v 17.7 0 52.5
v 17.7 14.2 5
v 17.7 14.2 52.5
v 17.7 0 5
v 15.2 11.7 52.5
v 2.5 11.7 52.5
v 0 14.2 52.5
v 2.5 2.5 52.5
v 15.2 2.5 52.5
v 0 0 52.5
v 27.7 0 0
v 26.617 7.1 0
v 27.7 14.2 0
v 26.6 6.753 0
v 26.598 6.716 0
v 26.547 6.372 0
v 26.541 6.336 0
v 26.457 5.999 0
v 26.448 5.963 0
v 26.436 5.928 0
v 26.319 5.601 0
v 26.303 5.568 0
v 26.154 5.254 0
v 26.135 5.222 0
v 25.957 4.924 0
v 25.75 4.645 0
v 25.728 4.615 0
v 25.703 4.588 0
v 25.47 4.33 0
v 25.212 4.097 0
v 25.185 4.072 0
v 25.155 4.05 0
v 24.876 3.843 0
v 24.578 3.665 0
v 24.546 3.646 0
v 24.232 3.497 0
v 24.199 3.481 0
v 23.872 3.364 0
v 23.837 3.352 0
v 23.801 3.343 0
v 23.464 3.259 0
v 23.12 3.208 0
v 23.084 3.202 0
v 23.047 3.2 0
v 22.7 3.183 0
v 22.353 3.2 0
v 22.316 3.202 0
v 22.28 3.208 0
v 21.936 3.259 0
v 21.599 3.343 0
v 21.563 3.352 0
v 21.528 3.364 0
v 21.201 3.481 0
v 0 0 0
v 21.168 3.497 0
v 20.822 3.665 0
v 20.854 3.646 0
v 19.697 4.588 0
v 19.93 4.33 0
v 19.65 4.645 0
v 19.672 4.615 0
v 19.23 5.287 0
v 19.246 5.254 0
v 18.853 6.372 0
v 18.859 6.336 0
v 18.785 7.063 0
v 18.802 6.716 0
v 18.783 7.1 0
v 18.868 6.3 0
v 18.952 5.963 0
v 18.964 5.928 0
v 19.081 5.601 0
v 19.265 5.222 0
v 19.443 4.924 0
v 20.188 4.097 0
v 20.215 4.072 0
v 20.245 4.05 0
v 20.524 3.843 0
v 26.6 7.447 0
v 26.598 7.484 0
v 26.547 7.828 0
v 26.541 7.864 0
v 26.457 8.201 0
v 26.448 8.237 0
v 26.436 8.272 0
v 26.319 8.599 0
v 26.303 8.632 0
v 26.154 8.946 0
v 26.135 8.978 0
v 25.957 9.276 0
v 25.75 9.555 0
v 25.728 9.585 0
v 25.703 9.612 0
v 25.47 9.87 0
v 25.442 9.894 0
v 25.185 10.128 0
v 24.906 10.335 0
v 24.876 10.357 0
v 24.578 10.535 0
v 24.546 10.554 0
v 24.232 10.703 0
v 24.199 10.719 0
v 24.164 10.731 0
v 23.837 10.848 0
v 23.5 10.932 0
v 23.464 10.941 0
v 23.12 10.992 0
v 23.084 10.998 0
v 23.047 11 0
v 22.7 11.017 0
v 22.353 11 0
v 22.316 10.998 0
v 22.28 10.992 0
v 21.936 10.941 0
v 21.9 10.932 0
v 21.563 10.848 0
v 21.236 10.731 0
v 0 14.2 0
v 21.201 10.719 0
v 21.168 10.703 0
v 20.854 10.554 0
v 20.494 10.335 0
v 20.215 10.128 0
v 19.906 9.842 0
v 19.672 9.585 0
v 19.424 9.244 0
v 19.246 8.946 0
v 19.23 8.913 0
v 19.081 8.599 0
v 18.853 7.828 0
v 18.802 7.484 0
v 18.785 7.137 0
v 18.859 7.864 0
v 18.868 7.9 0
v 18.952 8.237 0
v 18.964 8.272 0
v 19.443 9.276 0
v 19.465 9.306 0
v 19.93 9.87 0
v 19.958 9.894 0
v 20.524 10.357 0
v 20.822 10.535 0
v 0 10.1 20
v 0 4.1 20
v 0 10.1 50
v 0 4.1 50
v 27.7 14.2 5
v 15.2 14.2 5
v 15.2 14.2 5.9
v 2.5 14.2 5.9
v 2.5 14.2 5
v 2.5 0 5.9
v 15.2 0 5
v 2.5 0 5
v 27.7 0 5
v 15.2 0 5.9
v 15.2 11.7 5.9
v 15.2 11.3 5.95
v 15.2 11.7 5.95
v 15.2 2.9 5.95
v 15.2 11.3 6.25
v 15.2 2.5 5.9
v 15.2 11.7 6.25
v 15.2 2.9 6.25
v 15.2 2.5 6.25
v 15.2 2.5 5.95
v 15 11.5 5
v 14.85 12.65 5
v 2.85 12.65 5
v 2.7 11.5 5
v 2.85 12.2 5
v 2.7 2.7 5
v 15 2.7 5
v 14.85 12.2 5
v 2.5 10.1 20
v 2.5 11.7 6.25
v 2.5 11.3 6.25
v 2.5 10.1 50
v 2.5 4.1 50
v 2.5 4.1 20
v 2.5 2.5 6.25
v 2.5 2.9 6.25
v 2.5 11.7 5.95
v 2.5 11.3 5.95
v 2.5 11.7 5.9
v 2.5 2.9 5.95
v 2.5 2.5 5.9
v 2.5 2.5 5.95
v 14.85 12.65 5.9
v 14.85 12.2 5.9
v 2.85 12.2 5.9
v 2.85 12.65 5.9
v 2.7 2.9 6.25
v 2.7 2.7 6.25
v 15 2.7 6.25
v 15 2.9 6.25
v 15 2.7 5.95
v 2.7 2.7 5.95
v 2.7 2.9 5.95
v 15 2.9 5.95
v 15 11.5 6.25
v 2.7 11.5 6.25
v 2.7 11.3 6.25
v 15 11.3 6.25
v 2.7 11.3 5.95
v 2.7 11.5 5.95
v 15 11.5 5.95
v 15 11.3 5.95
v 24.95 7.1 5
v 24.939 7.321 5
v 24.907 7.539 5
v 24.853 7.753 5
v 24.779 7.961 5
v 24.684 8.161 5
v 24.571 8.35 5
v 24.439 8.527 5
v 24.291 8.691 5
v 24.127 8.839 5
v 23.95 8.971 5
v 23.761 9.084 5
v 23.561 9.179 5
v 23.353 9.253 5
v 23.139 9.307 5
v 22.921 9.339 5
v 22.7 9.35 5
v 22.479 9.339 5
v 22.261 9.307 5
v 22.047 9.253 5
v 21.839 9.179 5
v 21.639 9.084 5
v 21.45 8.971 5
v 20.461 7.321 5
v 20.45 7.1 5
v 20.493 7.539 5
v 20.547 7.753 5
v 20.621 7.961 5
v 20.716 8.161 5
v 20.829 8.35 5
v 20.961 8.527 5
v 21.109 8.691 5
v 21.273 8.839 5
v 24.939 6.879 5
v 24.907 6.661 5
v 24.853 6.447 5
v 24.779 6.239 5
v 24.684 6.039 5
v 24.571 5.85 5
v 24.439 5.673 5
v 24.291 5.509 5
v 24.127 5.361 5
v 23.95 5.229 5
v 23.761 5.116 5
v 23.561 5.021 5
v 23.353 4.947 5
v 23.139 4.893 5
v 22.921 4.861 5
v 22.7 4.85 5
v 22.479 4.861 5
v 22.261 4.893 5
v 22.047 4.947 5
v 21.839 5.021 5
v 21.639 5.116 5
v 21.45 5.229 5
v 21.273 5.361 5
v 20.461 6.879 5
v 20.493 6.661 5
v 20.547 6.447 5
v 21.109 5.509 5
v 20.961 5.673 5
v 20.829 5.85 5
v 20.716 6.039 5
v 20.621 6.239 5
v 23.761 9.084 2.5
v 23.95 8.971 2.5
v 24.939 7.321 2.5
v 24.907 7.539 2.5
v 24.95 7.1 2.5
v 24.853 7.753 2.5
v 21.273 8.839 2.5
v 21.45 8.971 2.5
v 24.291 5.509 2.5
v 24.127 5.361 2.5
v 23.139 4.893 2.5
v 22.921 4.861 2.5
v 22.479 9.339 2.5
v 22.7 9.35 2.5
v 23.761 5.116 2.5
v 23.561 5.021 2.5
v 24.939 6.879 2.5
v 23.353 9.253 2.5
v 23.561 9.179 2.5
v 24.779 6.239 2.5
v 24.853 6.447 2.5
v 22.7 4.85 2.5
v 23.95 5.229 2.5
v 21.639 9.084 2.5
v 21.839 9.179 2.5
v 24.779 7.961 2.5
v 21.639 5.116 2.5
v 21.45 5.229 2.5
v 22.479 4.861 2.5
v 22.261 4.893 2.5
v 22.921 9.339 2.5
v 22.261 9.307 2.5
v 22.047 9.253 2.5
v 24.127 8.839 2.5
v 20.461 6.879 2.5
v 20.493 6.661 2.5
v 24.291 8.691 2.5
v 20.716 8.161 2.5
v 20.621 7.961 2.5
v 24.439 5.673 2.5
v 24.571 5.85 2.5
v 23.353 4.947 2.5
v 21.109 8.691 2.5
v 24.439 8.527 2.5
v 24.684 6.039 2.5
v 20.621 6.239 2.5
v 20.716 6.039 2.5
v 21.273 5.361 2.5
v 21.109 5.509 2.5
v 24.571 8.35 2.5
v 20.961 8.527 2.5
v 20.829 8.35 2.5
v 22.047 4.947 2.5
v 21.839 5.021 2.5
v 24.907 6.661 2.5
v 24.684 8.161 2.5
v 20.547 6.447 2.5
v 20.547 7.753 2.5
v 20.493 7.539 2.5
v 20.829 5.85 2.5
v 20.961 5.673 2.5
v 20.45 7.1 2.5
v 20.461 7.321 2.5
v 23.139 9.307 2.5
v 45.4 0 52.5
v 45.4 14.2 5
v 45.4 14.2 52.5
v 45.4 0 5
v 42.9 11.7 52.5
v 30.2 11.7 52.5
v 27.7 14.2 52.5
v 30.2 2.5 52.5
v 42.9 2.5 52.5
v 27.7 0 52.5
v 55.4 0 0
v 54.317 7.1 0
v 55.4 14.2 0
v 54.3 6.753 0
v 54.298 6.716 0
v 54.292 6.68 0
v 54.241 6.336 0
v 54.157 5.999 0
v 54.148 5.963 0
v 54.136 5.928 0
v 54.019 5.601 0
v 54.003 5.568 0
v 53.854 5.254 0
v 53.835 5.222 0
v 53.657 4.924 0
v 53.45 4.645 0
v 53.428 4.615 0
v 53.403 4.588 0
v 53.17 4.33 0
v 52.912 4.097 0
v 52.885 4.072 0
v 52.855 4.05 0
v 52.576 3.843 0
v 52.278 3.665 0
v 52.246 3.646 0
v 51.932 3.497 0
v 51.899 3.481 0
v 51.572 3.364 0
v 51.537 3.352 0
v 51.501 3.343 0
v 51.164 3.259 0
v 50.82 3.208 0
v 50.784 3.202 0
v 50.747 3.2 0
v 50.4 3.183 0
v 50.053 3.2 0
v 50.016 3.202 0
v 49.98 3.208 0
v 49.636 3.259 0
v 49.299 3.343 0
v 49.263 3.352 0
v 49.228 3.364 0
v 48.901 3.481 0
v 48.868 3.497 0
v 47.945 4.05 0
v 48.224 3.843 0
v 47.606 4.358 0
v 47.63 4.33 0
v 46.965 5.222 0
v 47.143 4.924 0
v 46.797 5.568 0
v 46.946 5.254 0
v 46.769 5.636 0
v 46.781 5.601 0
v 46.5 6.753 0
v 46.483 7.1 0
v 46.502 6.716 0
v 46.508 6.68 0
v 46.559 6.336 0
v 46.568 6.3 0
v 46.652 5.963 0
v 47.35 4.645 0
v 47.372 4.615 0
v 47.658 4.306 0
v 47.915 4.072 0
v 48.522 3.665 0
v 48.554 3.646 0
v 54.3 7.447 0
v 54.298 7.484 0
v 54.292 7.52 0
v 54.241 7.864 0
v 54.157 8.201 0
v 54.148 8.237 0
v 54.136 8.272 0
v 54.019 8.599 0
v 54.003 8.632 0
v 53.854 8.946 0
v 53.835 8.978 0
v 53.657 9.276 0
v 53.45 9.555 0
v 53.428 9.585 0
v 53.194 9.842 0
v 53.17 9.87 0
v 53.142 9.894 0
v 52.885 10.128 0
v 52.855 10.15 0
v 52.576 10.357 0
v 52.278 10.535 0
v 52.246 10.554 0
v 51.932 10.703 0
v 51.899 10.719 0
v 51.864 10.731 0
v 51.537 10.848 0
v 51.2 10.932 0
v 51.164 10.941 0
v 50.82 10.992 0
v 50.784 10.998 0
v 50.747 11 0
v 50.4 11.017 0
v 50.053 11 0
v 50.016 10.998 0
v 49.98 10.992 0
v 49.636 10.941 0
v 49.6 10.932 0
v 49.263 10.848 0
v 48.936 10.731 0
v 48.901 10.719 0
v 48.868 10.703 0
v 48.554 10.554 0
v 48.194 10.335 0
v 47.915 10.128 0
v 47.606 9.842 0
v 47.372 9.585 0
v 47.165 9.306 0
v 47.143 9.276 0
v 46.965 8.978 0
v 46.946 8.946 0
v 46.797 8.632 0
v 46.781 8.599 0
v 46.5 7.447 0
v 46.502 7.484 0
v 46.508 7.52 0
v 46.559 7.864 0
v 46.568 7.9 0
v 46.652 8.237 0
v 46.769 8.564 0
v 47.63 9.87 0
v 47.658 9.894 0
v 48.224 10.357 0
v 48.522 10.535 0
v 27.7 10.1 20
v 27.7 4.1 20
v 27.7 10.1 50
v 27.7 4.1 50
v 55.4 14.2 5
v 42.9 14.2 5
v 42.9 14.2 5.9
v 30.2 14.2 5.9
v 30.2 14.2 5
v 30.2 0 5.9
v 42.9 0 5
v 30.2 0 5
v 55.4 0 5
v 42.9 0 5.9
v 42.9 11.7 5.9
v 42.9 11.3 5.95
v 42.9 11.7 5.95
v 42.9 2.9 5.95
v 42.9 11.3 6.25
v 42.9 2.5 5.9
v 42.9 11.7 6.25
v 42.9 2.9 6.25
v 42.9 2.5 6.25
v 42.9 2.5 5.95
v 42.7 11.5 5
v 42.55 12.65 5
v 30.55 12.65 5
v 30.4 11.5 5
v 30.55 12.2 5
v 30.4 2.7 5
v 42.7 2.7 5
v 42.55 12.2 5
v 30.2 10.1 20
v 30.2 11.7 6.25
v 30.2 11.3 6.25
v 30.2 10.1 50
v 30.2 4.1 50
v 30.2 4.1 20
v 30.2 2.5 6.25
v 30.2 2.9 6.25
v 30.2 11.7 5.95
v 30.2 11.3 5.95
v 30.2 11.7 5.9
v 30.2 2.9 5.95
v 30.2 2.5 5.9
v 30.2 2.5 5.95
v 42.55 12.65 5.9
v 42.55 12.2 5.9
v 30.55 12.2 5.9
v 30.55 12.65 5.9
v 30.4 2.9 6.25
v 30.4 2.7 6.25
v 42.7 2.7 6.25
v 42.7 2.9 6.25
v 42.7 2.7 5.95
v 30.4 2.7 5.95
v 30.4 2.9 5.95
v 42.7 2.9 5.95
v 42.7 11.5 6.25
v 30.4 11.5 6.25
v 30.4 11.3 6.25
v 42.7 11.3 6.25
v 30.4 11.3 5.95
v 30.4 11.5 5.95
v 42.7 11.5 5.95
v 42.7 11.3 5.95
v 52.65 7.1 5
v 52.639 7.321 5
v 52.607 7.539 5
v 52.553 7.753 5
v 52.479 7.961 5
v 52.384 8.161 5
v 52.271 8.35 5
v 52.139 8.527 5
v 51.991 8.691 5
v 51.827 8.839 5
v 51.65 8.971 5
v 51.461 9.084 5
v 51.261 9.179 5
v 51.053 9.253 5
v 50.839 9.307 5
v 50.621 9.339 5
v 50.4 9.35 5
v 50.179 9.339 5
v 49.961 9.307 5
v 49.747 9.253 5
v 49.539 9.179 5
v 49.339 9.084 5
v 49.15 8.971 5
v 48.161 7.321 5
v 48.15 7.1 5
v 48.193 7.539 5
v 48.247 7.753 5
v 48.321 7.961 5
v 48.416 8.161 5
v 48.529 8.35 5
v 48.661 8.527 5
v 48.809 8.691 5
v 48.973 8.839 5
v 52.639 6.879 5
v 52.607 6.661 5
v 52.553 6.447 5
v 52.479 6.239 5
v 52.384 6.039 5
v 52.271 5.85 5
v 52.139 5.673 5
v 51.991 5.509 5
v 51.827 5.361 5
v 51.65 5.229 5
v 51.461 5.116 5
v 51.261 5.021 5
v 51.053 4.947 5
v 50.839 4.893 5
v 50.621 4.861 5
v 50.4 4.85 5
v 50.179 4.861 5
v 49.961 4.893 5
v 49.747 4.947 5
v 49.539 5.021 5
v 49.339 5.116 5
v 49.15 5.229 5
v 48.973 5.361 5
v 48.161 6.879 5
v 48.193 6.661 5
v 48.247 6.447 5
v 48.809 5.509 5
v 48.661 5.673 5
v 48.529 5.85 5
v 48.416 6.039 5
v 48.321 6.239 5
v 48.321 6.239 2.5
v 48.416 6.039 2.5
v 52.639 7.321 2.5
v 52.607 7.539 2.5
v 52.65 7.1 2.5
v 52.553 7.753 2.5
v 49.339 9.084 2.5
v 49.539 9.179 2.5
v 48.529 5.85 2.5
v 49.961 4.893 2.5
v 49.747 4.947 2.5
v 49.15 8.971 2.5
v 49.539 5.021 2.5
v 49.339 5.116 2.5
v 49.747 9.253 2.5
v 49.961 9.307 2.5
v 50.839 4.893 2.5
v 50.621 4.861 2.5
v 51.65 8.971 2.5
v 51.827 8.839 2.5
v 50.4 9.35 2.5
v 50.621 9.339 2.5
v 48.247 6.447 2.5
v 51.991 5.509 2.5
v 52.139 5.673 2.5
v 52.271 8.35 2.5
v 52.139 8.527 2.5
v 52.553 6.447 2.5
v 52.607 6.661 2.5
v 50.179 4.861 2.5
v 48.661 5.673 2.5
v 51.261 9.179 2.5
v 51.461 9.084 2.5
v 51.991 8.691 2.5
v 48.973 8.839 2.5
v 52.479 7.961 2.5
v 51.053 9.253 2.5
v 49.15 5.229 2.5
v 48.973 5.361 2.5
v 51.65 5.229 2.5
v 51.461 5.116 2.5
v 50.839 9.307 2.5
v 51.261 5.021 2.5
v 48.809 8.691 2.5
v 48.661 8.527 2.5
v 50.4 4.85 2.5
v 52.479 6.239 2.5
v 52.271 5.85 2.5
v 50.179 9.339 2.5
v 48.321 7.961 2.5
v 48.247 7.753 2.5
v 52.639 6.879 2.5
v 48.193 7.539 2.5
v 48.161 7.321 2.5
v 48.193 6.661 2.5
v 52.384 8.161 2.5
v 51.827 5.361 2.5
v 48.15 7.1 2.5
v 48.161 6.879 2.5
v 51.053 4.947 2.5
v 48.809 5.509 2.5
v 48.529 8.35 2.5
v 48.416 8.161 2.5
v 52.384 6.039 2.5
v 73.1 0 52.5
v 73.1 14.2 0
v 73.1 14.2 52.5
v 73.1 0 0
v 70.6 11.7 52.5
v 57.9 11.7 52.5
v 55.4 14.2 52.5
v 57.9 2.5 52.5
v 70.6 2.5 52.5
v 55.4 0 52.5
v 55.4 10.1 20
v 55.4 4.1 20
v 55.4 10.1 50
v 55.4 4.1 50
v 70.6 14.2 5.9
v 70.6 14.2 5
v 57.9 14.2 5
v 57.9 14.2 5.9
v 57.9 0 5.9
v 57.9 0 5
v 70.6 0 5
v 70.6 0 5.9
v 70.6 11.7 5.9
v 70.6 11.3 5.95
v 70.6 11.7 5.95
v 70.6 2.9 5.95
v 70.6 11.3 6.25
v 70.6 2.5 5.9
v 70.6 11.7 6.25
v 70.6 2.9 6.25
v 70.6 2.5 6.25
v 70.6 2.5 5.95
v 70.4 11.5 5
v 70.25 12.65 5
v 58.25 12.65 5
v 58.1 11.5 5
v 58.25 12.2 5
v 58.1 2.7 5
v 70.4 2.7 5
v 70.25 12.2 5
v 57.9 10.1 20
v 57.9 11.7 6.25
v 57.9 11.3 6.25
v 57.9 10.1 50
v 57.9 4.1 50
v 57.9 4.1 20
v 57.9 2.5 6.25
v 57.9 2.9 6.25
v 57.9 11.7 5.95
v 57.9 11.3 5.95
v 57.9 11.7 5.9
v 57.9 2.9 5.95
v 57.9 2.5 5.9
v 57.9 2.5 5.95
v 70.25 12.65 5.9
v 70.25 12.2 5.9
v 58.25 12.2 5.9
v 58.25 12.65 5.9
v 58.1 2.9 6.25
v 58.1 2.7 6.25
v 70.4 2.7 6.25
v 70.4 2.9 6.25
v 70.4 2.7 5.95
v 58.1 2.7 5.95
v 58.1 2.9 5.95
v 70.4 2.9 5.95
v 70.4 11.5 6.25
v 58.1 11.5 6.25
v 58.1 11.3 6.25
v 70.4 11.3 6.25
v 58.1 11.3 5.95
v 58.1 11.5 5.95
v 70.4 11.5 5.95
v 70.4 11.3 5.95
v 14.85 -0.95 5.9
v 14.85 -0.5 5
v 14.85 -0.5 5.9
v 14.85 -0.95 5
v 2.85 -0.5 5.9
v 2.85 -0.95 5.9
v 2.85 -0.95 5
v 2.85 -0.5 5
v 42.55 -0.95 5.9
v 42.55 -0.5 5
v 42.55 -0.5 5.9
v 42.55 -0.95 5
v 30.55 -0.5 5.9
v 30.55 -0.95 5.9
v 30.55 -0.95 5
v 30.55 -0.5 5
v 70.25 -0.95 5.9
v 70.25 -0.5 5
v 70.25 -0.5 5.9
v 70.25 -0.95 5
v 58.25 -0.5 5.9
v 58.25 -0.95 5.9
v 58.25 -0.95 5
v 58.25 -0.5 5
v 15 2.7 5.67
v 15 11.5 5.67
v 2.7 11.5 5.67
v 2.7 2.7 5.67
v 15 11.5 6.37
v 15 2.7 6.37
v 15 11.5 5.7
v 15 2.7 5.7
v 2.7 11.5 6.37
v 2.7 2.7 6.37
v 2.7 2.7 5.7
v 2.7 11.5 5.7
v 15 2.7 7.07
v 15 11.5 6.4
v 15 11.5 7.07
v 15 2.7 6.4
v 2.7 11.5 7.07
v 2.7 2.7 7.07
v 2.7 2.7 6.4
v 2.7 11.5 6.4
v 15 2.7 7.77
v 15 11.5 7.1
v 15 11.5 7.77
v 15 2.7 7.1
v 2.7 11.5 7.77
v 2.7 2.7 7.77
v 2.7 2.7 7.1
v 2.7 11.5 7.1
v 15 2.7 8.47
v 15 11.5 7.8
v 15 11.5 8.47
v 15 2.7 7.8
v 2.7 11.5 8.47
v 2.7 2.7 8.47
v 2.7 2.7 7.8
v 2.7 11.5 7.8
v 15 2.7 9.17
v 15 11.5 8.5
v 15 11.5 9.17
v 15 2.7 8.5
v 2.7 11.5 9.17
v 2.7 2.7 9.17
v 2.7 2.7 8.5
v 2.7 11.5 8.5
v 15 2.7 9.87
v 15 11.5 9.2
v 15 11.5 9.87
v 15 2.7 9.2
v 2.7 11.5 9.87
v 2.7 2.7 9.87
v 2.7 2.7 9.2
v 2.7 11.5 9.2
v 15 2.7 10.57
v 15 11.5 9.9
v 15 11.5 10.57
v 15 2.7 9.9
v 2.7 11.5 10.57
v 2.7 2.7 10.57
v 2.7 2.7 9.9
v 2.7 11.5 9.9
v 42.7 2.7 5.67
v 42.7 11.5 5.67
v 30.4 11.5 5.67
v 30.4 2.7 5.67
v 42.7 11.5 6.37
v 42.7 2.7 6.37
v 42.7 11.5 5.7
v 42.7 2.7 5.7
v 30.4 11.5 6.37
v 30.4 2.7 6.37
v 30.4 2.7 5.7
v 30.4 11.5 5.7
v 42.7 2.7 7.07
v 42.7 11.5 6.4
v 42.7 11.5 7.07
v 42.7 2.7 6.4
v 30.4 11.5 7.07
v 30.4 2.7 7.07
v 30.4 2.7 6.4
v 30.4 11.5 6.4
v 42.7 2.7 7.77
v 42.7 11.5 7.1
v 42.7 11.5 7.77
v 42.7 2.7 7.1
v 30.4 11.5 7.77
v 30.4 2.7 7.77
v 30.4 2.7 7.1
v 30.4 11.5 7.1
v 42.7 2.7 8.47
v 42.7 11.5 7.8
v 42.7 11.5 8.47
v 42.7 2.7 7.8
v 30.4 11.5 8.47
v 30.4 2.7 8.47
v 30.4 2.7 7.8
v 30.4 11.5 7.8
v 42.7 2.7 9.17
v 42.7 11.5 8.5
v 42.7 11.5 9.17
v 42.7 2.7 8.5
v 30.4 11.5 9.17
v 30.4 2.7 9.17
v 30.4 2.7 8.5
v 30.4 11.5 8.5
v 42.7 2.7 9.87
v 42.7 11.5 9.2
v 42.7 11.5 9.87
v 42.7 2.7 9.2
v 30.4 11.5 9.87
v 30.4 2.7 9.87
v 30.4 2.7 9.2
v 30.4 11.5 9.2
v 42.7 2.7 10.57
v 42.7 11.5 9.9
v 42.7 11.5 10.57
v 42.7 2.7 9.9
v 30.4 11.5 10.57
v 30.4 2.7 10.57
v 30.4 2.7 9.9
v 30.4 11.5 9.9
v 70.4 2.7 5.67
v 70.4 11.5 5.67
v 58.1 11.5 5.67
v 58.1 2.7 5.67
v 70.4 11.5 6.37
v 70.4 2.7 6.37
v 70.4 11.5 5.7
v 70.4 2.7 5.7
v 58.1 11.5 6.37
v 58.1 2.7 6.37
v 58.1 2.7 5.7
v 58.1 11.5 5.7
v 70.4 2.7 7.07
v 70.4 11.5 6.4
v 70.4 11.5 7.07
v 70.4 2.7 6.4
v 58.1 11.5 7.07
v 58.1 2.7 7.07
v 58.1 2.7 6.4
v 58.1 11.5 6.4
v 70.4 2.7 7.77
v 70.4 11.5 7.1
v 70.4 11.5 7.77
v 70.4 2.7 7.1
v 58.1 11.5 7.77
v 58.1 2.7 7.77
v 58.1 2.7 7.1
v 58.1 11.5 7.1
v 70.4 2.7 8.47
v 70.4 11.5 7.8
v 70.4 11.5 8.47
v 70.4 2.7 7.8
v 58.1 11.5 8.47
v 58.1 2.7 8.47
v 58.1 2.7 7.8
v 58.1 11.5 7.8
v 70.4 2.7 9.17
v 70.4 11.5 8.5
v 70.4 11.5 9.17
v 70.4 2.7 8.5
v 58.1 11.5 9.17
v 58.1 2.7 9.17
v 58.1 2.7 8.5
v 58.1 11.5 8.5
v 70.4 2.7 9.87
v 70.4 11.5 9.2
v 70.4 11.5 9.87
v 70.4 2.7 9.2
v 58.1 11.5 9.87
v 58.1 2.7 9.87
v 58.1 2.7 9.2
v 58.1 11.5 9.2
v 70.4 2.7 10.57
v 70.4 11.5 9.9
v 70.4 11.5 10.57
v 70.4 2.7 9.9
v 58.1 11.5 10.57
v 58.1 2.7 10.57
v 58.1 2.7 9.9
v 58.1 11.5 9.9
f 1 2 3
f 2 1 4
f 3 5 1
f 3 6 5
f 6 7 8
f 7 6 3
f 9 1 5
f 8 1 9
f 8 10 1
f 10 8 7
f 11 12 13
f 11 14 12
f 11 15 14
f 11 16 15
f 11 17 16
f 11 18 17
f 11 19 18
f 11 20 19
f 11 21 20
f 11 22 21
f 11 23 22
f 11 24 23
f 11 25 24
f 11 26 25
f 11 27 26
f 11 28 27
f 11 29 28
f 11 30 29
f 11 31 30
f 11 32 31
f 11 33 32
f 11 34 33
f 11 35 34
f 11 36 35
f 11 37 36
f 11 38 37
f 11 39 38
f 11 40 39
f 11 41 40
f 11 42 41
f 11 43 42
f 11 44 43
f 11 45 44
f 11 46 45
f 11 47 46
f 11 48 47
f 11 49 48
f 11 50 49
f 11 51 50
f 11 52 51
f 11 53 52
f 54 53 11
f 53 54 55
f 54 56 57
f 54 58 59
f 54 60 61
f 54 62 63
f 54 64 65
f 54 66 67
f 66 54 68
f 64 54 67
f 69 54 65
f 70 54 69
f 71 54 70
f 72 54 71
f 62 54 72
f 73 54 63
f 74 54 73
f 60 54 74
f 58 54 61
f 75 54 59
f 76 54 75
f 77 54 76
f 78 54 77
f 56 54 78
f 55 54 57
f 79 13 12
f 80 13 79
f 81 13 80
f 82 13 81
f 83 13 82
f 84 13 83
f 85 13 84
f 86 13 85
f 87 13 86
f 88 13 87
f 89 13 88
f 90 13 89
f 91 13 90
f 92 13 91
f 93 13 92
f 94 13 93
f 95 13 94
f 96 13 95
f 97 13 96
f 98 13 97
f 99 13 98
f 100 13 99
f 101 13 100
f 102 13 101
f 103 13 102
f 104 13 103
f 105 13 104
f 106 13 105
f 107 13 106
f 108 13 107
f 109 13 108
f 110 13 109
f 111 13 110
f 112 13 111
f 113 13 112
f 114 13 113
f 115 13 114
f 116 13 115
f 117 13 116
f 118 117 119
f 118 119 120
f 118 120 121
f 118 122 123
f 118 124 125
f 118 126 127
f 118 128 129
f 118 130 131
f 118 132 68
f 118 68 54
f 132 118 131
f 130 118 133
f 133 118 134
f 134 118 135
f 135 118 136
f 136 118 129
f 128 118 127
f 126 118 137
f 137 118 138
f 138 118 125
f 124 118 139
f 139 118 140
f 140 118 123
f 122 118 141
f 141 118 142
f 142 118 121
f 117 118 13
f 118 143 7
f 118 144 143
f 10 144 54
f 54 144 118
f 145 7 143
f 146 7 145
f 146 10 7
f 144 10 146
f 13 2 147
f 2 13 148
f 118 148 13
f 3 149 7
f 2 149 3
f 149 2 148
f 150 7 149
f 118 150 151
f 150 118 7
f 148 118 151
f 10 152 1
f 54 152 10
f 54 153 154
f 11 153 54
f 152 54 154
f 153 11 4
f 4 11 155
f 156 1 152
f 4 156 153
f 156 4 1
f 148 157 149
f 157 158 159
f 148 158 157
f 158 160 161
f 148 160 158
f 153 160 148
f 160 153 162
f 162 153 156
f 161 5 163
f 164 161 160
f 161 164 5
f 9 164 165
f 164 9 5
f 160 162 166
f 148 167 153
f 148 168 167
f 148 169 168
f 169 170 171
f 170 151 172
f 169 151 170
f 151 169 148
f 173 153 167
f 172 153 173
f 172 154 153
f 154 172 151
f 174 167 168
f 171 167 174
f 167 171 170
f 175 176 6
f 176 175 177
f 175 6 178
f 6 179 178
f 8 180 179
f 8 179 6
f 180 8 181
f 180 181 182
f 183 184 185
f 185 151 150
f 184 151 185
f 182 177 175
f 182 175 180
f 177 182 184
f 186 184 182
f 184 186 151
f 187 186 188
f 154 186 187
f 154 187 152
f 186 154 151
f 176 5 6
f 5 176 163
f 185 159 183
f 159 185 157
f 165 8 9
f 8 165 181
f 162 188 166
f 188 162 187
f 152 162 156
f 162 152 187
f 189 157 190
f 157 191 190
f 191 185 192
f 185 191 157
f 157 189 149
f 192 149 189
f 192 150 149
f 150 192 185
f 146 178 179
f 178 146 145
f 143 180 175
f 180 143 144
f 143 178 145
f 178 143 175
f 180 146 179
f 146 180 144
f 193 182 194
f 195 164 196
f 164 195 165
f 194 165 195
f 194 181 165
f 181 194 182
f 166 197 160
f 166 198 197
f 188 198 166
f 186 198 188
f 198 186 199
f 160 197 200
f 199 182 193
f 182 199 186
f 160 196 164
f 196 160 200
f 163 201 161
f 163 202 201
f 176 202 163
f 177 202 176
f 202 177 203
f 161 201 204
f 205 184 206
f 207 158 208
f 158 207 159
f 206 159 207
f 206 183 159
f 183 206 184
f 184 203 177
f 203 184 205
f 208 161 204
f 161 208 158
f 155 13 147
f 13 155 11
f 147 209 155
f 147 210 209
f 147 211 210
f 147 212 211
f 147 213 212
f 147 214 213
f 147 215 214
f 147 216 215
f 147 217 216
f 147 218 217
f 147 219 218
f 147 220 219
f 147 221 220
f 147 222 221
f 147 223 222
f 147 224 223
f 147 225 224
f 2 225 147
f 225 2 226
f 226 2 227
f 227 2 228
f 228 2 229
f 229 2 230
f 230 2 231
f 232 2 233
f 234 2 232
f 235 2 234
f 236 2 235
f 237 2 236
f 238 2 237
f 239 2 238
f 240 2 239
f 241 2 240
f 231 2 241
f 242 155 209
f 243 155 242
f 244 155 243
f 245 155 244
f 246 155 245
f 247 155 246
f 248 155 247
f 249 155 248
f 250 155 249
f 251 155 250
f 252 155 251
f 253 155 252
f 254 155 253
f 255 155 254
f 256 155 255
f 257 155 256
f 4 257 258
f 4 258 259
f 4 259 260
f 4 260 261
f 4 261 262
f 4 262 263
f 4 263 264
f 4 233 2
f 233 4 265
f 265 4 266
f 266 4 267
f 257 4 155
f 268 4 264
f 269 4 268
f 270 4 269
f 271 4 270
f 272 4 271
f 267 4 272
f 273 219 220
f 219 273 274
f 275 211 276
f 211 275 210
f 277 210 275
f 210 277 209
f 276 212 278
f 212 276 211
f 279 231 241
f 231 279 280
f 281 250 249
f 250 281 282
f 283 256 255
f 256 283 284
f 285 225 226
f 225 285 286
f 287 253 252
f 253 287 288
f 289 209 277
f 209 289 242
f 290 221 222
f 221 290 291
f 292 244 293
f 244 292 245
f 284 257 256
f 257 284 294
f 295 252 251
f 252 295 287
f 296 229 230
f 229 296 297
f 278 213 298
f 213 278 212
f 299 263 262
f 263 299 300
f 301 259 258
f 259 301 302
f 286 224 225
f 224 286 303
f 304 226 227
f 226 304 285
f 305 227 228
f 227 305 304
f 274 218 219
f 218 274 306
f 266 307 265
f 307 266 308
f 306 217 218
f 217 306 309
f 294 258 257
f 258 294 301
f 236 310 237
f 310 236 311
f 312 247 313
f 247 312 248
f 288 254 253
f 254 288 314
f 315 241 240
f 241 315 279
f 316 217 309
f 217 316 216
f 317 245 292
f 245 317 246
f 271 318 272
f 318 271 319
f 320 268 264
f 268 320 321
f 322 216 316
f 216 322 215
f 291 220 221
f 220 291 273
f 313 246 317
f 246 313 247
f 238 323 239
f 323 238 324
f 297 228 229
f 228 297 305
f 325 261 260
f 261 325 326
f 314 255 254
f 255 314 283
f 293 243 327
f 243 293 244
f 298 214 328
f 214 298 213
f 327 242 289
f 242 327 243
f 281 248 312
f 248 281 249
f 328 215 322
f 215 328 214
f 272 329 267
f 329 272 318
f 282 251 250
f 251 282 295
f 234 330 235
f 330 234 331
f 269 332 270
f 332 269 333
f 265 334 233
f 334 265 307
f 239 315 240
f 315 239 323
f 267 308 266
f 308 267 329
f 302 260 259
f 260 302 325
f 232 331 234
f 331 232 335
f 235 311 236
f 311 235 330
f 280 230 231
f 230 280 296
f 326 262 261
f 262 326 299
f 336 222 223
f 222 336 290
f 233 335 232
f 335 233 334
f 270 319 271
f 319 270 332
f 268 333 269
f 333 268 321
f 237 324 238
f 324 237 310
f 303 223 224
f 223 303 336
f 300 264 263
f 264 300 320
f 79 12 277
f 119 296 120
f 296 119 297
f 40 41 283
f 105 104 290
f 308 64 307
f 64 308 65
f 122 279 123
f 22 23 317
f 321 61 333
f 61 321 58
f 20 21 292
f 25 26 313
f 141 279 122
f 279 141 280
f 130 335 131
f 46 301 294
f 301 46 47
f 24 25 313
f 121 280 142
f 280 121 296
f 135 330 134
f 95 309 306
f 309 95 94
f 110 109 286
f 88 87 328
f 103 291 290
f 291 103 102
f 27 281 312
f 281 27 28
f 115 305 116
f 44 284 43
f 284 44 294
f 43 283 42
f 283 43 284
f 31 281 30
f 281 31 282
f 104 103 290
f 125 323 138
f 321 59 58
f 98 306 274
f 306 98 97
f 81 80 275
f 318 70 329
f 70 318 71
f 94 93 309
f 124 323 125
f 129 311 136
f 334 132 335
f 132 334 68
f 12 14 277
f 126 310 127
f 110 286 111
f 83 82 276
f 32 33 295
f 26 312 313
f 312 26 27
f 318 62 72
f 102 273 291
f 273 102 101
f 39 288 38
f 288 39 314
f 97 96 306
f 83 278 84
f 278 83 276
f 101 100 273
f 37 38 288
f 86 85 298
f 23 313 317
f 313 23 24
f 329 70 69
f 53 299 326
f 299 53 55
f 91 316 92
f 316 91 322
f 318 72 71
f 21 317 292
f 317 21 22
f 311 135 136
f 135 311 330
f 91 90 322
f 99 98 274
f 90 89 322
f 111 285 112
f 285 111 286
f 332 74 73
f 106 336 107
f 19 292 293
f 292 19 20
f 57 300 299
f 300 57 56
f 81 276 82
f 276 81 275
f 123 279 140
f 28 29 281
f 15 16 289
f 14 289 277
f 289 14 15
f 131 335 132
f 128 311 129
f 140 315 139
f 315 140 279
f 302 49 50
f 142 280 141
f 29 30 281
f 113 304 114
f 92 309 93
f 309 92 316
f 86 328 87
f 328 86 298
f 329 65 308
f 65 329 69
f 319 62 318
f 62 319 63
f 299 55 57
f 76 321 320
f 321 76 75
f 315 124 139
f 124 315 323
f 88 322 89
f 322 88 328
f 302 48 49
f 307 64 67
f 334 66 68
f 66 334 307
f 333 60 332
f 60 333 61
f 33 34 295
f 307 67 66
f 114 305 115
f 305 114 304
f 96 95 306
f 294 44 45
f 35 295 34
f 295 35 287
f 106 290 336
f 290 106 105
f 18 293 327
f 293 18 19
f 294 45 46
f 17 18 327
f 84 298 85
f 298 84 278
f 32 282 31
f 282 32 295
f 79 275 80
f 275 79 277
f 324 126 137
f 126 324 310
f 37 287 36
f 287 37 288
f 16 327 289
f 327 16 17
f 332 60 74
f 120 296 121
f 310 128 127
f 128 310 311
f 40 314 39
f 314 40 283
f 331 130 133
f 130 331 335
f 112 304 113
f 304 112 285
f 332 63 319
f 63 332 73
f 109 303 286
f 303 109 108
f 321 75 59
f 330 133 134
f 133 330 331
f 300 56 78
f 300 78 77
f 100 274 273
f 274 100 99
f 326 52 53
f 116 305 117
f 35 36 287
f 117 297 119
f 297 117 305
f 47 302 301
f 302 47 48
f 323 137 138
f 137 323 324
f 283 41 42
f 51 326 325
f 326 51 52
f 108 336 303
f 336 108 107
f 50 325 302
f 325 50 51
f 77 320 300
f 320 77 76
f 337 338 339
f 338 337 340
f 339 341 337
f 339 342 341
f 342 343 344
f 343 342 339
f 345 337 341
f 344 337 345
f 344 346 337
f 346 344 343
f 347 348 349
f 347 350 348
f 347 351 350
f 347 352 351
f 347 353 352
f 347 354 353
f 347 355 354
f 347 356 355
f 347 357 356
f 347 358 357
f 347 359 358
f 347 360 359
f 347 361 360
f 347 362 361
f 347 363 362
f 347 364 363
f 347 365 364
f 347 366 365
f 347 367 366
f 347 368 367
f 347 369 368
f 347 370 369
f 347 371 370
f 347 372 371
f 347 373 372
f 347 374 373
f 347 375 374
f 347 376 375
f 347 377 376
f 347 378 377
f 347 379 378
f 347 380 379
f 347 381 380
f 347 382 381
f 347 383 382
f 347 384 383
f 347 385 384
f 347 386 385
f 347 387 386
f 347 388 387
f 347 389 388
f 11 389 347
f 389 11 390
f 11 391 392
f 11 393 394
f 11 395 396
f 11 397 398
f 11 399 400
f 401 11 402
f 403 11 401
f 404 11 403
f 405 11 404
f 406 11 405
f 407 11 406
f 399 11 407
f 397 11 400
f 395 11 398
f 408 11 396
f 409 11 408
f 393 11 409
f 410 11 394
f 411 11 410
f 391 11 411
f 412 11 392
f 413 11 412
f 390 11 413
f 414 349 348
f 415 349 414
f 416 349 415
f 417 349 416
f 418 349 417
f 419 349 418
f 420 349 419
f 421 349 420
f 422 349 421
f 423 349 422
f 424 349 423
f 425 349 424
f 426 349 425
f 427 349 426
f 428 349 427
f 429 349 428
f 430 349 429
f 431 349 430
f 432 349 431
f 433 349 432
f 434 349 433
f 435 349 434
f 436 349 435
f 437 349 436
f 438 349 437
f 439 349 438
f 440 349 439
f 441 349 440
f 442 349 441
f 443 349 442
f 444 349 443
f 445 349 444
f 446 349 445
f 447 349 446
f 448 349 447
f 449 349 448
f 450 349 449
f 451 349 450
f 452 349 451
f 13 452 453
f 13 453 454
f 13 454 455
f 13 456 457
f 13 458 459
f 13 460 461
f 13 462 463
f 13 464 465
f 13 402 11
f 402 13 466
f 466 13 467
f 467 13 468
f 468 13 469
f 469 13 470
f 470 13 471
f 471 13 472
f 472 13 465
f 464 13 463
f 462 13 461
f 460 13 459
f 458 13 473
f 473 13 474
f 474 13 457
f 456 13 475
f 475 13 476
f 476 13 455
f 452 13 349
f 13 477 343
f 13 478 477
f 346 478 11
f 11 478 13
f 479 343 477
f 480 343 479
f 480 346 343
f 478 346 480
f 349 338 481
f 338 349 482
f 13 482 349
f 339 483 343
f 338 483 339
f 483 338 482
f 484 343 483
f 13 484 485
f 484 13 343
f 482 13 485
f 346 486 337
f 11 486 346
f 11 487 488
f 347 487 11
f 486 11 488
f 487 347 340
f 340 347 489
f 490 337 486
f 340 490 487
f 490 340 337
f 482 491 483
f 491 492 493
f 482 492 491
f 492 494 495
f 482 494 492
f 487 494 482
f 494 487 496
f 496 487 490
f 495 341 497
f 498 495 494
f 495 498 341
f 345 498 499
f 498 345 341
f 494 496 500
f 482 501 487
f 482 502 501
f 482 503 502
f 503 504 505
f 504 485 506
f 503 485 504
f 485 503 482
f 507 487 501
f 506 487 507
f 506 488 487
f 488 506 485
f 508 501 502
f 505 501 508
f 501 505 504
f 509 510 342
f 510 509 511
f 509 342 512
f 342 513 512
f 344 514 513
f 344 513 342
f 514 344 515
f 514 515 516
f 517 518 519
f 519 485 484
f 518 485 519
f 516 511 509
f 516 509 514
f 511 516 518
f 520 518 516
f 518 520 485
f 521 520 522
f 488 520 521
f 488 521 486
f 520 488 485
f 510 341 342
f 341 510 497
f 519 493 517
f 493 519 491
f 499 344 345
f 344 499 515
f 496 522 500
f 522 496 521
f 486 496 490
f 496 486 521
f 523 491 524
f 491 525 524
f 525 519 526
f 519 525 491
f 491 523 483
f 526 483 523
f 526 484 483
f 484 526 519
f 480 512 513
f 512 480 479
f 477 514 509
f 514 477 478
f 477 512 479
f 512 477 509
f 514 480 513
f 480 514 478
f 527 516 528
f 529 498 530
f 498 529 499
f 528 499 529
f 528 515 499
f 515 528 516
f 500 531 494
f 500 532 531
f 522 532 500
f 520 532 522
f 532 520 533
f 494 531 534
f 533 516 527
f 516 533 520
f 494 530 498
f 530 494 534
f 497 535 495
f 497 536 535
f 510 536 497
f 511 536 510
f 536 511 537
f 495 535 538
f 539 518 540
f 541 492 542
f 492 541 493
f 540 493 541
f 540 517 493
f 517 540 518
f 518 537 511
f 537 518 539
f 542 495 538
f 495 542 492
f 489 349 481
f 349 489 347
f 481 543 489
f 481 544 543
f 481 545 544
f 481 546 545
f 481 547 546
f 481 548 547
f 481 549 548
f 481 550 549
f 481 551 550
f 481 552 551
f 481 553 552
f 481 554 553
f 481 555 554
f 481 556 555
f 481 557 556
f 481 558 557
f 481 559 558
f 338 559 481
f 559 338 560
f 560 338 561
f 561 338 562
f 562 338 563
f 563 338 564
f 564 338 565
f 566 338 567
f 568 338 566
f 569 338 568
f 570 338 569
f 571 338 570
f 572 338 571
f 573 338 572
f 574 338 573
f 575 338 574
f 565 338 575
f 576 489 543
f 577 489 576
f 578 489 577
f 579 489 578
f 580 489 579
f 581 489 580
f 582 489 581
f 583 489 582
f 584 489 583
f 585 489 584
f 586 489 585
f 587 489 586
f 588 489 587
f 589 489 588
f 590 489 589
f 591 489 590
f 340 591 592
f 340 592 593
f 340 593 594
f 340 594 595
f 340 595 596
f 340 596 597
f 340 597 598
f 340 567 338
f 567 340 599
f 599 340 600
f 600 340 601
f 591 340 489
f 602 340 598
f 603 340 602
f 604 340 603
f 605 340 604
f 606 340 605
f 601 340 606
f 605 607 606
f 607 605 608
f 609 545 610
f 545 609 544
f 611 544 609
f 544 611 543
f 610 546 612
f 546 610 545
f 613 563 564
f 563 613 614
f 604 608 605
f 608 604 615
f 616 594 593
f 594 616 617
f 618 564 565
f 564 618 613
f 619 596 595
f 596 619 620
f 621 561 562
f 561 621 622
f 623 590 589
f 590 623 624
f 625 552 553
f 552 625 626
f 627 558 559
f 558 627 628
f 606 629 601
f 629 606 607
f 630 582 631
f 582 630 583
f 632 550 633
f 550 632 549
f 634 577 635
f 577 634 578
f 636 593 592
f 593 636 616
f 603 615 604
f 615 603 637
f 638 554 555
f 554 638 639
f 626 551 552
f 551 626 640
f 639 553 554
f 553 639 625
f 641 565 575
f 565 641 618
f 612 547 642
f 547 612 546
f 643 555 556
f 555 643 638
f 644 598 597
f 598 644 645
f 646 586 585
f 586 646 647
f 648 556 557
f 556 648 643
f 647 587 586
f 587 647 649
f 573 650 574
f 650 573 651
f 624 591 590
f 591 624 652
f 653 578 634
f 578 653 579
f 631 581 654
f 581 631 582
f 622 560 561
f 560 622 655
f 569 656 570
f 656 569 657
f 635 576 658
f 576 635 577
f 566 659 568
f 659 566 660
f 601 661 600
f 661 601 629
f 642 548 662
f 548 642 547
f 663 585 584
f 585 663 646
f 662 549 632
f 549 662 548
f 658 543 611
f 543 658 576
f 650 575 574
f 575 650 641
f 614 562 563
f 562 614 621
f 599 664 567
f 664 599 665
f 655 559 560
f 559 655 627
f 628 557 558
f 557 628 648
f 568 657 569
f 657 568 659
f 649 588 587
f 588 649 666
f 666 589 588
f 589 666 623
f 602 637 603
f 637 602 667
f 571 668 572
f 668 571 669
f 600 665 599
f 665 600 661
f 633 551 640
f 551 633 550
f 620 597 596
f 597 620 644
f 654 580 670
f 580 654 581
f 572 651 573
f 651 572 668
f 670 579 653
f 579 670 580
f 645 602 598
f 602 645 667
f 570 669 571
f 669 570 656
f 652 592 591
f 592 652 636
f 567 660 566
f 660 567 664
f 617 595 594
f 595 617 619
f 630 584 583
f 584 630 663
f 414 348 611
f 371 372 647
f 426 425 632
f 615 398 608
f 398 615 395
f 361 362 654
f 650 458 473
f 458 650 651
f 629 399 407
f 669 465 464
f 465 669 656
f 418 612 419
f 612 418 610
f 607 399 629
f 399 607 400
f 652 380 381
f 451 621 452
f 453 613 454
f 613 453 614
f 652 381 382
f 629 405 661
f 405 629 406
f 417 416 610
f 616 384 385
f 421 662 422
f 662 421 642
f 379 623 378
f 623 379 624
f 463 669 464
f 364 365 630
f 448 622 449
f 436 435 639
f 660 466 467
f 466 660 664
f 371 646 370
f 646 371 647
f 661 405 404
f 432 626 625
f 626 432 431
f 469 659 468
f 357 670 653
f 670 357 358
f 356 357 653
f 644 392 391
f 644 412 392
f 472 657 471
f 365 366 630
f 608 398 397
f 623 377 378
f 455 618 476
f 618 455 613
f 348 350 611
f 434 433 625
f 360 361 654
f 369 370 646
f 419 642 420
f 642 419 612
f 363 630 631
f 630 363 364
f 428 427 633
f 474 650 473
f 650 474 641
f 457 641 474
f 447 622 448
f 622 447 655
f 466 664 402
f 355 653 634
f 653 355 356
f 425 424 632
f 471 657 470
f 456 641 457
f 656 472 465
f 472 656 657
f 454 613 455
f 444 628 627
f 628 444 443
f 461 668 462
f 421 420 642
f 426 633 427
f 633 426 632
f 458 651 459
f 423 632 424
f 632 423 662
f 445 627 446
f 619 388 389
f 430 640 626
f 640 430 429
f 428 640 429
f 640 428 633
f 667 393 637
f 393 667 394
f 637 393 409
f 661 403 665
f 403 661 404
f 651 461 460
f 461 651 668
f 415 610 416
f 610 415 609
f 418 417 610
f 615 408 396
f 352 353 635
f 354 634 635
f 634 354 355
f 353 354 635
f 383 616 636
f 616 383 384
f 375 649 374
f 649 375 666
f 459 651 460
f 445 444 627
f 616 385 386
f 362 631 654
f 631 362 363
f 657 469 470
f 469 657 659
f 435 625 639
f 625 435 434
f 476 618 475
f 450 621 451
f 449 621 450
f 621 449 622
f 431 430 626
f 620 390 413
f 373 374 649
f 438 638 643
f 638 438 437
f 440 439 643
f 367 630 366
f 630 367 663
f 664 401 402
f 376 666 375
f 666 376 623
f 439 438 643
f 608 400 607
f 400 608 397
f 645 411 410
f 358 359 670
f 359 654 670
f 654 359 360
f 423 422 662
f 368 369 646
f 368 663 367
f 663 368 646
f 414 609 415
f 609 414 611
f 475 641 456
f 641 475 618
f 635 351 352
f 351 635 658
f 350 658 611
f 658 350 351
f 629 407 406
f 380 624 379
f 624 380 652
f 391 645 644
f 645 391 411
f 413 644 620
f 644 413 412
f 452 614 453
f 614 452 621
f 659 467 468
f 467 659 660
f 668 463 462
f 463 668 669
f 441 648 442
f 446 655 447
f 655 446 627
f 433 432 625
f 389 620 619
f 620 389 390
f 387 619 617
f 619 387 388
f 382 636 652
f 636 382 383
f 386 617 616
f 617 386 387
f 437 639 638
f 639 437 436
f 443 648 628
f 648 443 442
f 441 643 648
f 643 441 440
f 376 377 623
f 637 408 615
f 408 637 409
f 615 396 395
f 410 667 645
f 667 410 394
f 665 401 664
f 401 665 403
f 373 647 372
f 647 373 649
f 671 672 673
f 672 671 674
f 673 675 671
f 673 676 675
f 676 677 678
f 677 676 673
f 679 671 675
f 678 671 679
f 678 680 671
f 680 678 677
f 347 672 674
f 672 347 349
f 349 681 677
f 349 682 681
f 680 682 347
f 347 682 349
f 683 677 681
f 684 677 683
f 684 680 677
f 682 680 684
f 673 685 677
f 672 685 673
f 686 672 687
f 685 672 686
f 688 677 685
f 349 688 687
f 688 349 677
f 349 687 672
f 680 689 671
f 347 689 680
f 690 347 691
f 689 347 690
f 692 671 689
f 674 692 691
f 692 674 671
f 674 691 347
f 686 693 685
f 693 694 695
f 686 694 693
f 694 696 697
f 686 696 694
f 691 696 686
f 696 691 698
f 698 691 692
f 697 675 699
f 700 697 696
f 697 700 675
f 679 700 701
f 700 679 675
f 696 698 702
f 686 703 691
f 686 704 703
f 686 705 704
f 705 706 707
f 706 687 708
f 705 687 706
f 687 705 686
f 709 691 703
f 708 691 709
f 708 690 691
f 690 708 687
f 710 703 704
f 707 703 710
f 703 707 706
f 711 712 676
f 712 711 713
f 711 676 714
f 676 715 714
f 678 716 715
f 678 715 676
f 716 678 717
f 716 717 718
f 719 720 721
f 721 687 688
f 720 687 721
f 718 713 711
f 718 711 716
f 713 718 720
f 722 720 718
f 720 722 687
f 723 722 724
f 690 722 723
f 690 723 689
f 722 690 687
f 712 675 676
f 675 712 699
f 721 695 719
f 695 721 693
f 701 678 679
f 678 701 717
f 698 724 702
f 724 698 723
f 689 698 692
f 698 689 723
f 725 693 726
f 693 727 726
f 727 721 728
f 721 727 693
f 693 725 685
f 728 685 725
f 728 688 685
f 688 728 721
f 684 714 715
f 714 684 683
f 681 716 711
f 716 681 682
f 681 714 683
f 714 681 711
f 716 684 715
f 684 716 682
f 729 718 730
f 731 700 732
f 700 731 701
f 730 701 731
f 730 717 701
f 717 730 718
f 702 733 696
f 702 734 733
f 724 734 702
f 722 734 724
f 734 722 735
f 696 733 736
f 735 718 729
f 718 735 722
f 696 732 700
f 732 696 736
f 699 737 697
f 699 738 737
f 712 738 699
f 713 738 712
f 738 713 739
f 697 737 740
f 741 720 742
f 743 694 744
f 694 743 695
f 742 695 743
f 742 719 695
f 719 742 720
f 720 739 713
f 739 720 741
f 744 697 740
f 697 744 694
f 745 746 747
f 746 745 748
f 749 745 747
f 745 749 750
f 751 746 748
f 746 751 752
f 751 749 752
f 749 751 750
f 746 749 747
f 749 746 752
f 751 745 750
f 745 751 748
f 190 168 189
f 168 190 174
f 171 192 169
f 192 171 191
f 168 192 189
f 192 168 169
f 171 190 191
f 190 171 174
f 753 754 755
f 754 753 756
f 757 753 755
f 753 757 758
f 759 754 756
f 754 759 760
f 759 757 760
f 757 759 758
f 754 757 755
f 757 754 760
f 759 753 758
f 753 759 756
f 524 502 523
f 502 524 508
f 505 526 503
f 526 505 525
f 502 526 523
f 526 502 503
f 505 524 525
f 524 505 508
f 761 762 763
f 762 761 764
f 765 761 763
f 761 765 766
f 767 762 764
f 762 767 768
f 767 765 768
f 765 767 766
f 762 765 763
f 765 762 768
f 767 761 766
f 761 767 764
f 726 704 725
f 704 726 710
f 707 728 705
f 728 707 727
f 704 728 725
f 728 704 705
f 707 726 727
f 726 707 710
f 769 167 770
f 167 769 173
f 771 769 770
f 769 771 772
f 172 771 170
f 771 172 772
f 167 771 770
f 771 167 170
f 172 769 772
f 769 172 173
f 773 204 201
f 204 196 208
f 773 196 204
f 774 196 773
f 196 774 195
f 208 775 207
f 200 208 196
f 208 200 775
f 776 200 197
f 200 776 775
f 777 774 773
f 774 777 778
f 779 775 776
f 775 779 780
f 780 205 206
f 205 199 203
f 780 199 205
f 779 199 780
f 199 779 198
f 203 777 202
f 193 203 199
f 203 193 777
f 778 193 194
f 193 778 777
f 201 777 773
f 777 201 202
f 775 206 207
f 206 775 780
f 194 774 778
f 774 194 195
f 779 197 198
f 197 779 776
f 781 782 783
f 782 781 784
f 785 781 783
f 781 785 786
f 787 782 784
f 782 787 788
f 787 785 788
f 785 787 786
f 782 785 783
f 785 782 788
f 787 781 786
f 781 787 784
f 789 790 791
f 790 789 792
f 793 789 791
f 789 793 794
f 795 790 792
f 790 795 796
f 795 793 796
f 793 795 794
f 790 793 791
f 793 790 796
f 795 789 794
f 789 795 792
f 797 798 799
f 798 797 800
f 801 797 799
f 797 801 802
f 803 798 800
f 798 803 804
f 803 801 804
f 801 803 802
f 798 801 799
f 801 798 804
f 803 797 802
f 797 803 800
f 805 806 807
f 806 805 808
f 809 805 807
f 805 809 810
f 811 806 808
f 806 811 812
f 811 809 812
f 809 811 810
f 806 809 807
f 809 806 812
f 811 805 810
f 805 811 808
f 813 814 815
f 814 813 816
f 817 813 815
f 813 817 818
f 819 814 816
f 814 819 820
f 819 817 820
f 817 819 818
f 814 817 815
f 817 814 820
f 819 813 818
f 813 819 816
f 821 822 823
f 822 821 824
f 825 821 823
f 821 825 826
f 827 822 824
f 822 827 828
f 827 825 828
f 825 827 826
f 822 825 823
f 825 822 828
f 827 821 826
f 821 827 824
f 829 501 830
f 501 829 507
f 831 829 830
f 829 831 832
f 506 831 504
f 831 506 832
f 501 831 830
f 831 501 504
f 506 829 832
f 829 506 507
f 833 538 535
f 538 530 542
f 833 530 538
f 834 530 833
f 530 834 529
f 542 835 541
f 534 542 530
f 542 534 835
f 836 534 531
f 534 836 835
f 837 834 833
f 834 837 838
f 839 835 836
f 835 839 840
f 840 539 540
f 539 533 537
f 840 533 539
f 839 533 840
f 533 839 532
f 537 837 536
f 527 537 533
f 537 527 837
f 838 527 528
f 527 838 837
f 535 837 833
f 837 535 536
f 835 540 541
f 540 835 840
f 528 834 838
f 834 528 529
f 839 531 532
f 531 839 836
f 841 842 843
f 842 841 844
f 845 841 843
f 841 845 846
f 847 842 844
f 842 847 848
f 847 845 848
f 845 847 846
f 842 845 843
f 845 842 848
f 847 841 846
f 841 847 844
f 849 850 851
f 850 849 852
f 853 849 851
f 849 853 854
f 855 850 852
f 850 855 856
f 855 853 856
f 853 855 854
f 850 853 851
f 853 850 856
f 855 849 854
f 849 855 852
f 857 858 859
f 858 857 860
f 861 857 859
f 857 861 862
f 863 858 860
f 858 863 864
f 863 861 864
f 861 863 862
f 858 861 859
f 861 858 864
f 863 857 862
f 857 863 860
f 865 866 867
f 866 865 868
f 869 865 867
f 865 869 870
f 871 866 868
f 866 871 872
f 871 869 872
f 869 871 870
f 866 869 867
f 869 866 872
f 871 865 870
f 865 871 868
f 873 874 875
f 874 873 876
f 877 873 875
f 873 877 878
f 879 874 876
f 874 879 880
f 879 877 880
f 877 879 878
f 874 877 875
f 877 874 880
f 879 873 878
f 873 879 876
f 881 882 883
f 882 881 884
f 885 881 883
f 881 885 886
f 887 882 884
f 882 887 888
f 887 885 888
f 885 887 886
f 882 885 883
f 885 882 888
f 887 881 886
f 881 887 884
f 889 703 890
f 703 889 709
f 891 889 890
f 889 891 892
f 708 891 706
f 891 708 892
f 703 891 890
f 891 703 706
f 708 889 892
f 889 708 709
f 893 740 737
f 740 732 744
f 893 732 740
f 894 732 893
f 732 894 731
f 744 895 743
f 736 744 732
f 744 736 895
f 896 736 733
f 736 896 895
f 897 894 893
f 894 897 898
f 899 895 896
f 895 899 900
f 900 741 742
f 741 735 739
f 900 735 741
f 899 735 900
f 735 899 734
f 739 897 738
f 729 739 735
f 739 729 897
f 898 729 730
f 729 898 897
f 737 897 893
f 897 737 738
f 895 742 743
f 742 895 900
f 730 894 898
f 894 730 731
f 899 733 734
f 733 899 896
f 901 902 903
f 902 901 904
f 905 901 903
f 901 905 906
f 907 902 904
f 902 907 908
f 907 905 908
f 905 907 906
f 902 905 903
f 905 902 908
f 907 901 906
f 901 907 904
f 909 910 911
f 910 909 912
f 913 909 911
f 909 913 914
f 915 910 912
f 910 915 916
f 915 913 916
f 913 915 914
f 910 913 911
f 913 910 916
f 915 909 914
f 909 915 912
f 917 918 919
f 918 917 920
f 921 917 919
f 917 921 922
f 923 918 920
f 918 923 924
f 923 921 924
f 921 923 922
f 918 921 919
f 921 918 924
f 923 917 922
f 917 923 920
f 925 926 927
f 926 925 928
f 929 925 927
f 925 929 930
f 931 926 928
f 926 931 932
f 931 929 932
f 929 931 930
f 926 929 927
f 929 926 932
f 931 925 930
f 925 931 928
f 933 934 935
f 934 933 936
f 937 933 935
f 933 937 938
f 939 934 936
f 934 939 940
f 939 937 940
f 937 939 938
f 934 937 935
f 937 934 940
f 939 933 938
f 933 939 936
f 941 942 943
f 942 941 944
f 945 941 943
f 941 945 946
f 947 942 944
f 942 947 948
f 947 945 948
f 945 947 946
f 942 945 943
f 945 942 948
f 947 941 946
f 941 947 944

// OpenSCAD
// Triple Nano-SIM Gravity Dispenser Array - Ceiling Mount
// VERSION 3.0 - Production Array with Downward Mounting
// Units: mm

$fn = 64;

// ========================
// PARAMETERS
// ========================

// Core SIM specs (Nano-SIM)
card_w = 12.3;    // X-axis (longer side)
card_d = 8.8;     // Y-axis (shorter side)  
card_t = 0.67;    // Z-axis (thickness)

// Capacity & spacing
N_CARDS = 50;
inter_gap = 0.03;
headroom = 5;

// Clearances
clearance_side = 0.2;
inner_w = card_w + 2*clearance_side;
inner_d = card_d + 2*clearance_side;

// Structure
wall = 2.5;
base_thk = 5.0;      // Base thickness (now mounting surface)
slot_h = 0.9;        // Slot height
dual_slots = true;   // Opposing pusher slots

// ANTI-DOUBLE-FEED LEDGE
enable_ledge = true;
ledge_depth = 0.4;
ledge_height = 0.3;
ledge_offset = 0.05;

// ARRAY CONFIGURATION
num_tubes = 3;
tube_spacing = 10;   // 10mm center-to-center spacing between tubes

// ADHESIVE MOUNTING (clean base, no flanges)
enable_flange = false;     // Using glue/adhesive instead

// Visual aids
pusher_thk = 0.45;
pusher_width = inner_w - 0.7;
stroke = card_d + 1.5;

// Visibility window
enable_window = true;
window_width = 6;
window_start = 15;
window_height = 30;

// Calculated heights
stack_h = N_CARDS * card_t + N_CARDS * inter_gap + headroom;
tube_top = base_thk + stack_h;
outer_h = tube_top + wall + 5;

// Total array width
total_width = (inner_w + 2*wall) * num_tubes + tube_spacing * (num_tubes - 1);

// ========================
// SINGLE TUBE MODULE
// ========================

module single_tube() {
    difference() {
        // Main tube body
        cube([inner_w + 2*wall, inner_d + 2*wall, outer_h]);
        
        // Internal cavity (starts immediately after base)
        translate([wall, wall, base_thk])
            cube([inner_w, inner_d, stack_h + 10]);
        
        // FRONT pusher slot (starts immediately at base_thk)
        translate([wall, -1, base_thk])
            cube([inner_w, wall + 2, slot_h]);
        
        // REAR pusher slot (starts immediately at base_thk)
        if (dual_slots) {
            translate([wall, wall + inner_d - 1, base_thk])
                cube([inner_w, wall + 2, slot_h]);
        }
        
        // Visibility window (side wall)
        if (enable_window) {
            translate([-1, wall + (inner_d - window_width)/2, base_thk + window_start])
                cube([wall + 2, window_width, window_height]);
        }
    }
    
    // ANTI-DOUBLE-FEED LEDGES (immediately above slot)
    if (enable_ledge) {
        ledge_z = base_thk + slot_h + ledge_offset;
        
        // Front ledge
        translate([wall, wall, ledge_z])
            cube([inner_w, ledge_depth, ledge_height]);
        
        // Rear ledge
        if (dual_slots) {
            translate([wall, wall + inner_d - ledge_depth, ledge_z])
                cube([inner_w, ledge_depth, ledge_height]);
        }
    }
}

// ========================
// TRIPLE TUBE ARRAY WITH MOUNTING
// ========================

module tube_array() {
    tube_width = inner_w + 2*wall;
    connecting_arm_width = 2;  // Thin connecting arms
    
    // Generate 3 tubes with connecting arms
    for (i = [0:num_tubes-1]) {
        x_pos = i * (tube_width + tube_spacing);
        
        // Individual tube
        translate([x_pos, 0, 0])
            single_tube();
        
        // Connecting arm to next tube (except for last tube)
        if (i < num_tubes - 1) {
            difference() {
                // Connecting arm
                translate([x_pos + tube_width, 0, 0])
                    cube([tube_spacing, inner_d + 2*wall, base_thk]);
                
                // M4 mounting hole through connecting arm
                translate([x_pos + tube_width + tube_spacing/2, 
                          (inner_d + 2*wall)/2, 
                          -1])
                    cylinder(d=4.5, h=base_thk + 2);  // M4 clearance hole
                
                // Countersink from bottom for M4 flat head screw
                translate([x_pos + tube_width + tube_spacing/2, 
                          (inner_d + 2*wall)/2, 
                          -0.5])
                    cylinder(d1=8.5, d2=4.5, h=3);  // M4 countersink
            }
        }
    }
}

// ========================
// VISUAL COMPONENTS
// ========================

module pusher_assembly(tube_index, y_offset, retracted=true) {
    tube_width = inner_w + 2*wall;
    x_base = tube_index * (tube_width + tube_spacing);
    push_dist = retracted ? 0 : stroke;
    
    color("SteelBlue", 0.7)
    translate([x_base + wall + (inner_w - pusher_width)/2, 
               y_offset + push_dist, 
               base_thk])
        cube([pusher_width, pusher_thk, slot_h]);
}

module sample_cards(tube_index, count=6) {
    tube_width = inner_w + 2*wall;
    x_base = tube_index * (tube_width + tube_spacing);
    
    color("Gold", 0.8)
    for (i = [0:count-1]) {
        translate([x_base + wall + clearance_side, 
                   wall + clearance_side, 
                   base_thk + i*(card_t + inter_gap)])
            cube([card_w, card_d, card_t]);
    }
}

module mounting_screws() {
    // No mounting hardware - adhesive mounting
}

module test_coupon() {
    // Test piece: bottom section with slots and ledges
    intersection() {
        tube_array();
        translate([0, 0, 0])
            cube([total_width, inner_d + 2*wall, base_thk + 8]);
    }
}

module full_assembly() {
    // Main tube array
    tube_array();
    
    // Visual pushers for each tube (front slot)
    for (i = [0:num_tubes-1]) {
        pusher_assembly(i, -pusher_thk - 0.5, retracted=true);
        if (dual_slots) 
            pusher_assembly(i, inner_d + wall + 0.5, retracted=true);
    }
    
    // Sample cards in each tube
    for (i = [0:num_tubes-1]) {
        sample_cards(i, min(8, N_CARDS));
    }
    
    // Visual mounting screws
    mounting_screws();
        
    // Tube labels on base
    color("Black")
    for (i = [0:num_tubes-1]) {
        tube_width = inner_w + 2*wall;
        x_pos = i * (tube_width + tube_spacing) + tube_width/2;
        
        translate([x_pos, (inner_d + 2*wall)/2, 0.2])
            linear_extrude(0.5)
            text(str(i+1), size=4, halign="center", valign="center", 
                 font="Liberation Sans:style=Bold");
    }
}

// ========================
// RENDER SELECTION
// ========================

RENDER_MODE = "full"; // Options: "full", "test_coupon", "array_only"

if (RENDER_MODE == "full") {
    full_assembly();
} else if (RENDER_MODE == "test_coupon") {
    test_coupon();
} else if (RENDER_MODE == "array_only") {
    tube_array();
}

// ========================
// DESIGN NOTES - VERSION 3.1
// ========================

// CRITICAL FEATURES:
// 1. ✅ CLEAN 5mm BASE - perfect for adhesive mounting
// 2. ✅ SLOTS start IMMEDIATELY after base (at z = 5mm)
// 3. ✅ NO FLANGES - streamlined design
// 4. ✅ 3 TUBES in array, 10mm apart (center-to-center)
// 5. ✅ THIN CONNECTING ARMS (2mm) between tubes at base
// 6. ✅ M4 MOUNTING HOLES in connecting arms (2 holes total)
// 7. ✅ DUAL SLOTS on opposing walls - fully unobstructed
// 8. ✅ ANTI-DOUBLE-FEED LEDGES at slot exit

// MOUNTING CONFIGURATION:
// - Two M4 holes in connecting arms between tubes
// - Hole 1: Between tube 1 and tube 2
// - Hole 2: Between tube 2 and tube 3
// - 4.5mm diameter (M4 clearance)
// - Countersunk from bottom for M4 flat head screws
// - Combined with adhesive for maximum security

// ADHESIVE MOUNTING:
// Recommended adhesives:
// - 3M VHB Tape (heavy duty double-sided)
// - Two-part epoxy (permanent)
// - Cyanoacrylate (CA/super glue) - quick setting
// - Hot glue (temporary/removable option)
// 
// Surface prep:
// 1. Sand base lightly (120 grit) for better adhesion
// 2. Clean with isopropyl alcohol
// 3. Apply adhesive to full base surface
// 4. Insert M4 screws through holes into platform
// 5. Tighten screws while adhesive is wet
// 6. Allow to cure fully

// MOUNTING HARDWARE:
// - 2× M4 × 8-10mm flat head screws (countersunk)
// - Screws insert from bottom (pointing up into platform)
// - Platform needs M4 threaded inserts or tapped holes
// - Screw positions: 23.65mm and 51.25mm from left edge

// PUSHER CLEARANCE:
// ✓ Bottom slots completely clear at z = 5mm
// ✓ No mounting hardware interferes with blade travel
// ✓ Pusher can slide full stroke without obstruction
// ✓ Base is flat 5mm surface (maximum glue contact area)

// SLOT CONFIGURATION:
// - Front wall: Slot from z=5.0mm to z=5.9mm
// - Rear wall: Slot from z=5.0mm to z=5.9mm
// - Ledge at z=5.95mm catches 2nd card
// - Pusher enters from either side (0.45mm thick blade)

// ASSEMBLY INSTRUCTIONS:
// 1. Print array upright (tubes pointing up)
// 2. Clean slots with 0.8mm feeler gauge
// 3. Test pusher blade clearance through slots
// 4. Prepare base surface (sand + clean)
// 5. Apply adhesive to full base
// 6. Position on platform, insert M4 screws from below
// 7. Tighten screws while adhesive is wet
// 8. Allow adhesive to cure fully
// 9. Install pusher mechanisms at front/rear
// 10. Load cards from top

// DIMENSIONAL SUMMARY:
// Single tube: 17.3mm (W) × 14.3mm (D) × ~45mm (H)
// Triple array: 61.9mm (W) × 14.3mm (D) × ~45mm (H)
// Tube spacing: 10mm center-to-center
// Connecting arm width: 10mm (between tubes)
// Base thickness: 5mm (flat adhesive surface)
// Base footprint: 61.9mm × 14.3mm = 885mm²
// M4 hole positions: 23.65mm, 51.25mm from left edge
// Total capacity: 150 cards (50 per tube)

// TOLERANCE VERIFICATION:
// ✓ Card (0.67mm) + clearance in 0.9mm slot
// ✓ Ledge (0.95mm) blocks double-feed (1.34mm)
// ✓ Pusher (0.45mm) clears ledge with margin
// ✓ M3 holes (3.2mm) for easy screw insertion
